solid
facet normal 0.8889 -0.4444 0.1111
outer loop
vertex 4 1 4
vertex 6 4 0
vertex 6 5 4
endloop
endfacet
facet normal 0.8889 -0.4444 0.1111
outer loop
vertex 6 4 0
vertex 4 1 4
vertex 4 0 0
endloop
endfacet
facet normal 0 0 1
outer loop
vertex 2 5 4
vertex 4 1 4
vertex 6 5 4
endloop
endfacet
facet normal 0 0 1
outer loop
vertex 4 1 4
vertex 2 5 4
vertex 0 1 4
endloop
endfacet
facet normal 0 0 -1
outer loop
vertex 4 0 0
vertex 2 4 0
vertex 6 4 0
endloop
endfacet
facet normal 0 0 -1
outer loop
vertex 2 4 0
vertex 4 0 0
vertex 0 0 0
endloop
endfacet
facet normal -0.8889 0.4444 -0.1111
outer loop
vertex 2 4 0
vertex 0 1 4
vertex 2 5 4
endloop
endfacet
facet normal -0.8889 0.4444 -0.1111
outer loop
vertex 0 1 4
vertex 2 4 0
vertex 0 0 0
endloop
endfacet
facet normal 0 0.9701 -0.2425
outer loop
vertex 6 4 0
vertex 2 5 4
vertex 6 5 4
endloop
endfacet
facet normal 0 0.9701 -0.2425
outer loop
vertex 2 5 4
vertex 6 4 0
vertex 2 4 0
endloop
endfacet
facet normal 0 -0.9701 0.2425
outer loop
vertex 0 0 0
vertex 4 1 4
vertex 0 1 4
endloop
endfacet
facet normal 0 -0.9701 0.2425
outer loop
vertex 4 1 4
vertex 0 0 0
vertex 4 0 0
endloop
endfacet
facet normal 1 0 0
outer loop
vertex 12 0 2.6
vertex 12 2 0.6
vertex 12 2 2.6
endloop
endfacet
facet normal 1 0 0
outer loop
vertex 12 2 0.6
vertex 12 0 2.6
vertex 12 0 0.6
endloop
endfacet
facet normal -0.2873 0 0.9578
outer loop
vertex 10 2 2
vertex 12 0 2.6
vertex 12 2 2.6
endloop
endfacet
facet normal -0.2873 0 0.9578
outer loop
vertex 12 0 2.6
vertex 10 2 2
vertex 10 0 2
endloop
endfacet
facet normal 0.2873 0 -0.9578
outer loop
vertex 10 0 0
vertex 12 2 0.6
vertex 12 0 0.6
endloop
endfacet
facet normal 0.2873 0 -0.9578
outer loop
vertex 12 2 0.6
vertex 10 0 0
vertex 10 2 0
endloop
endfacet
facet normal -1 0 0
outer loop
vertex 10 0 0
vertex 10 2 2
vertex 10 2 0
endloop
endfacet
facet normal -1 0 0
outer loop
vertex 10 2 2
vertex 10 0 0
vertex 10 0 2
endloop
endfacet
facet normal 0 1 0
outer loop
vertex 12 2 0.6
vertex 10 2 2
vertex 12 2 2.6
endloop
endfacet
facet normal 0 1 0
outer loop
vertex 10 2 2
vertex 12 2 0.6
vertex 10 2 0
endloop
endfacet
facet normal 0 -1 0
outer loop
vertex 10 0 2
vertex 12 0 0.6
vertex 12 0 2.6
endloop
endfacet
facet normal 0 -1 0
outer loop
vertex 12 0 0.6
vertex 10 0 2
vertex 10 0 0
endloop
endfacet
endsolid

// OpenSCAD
// shear with multmatrix (4x4 and 3x4 matrices)
multmatrix([[1, 0.5, 0, 0], [0, 1, 0.25, 0], [0, 0, 1, 0], [0, 0, 0, 1]]) cube(4);
multmatrix([[1, 0, 0, 10], [0, 1, 0, 0], [0.3, 0, 1, 0]]) cube(2);
